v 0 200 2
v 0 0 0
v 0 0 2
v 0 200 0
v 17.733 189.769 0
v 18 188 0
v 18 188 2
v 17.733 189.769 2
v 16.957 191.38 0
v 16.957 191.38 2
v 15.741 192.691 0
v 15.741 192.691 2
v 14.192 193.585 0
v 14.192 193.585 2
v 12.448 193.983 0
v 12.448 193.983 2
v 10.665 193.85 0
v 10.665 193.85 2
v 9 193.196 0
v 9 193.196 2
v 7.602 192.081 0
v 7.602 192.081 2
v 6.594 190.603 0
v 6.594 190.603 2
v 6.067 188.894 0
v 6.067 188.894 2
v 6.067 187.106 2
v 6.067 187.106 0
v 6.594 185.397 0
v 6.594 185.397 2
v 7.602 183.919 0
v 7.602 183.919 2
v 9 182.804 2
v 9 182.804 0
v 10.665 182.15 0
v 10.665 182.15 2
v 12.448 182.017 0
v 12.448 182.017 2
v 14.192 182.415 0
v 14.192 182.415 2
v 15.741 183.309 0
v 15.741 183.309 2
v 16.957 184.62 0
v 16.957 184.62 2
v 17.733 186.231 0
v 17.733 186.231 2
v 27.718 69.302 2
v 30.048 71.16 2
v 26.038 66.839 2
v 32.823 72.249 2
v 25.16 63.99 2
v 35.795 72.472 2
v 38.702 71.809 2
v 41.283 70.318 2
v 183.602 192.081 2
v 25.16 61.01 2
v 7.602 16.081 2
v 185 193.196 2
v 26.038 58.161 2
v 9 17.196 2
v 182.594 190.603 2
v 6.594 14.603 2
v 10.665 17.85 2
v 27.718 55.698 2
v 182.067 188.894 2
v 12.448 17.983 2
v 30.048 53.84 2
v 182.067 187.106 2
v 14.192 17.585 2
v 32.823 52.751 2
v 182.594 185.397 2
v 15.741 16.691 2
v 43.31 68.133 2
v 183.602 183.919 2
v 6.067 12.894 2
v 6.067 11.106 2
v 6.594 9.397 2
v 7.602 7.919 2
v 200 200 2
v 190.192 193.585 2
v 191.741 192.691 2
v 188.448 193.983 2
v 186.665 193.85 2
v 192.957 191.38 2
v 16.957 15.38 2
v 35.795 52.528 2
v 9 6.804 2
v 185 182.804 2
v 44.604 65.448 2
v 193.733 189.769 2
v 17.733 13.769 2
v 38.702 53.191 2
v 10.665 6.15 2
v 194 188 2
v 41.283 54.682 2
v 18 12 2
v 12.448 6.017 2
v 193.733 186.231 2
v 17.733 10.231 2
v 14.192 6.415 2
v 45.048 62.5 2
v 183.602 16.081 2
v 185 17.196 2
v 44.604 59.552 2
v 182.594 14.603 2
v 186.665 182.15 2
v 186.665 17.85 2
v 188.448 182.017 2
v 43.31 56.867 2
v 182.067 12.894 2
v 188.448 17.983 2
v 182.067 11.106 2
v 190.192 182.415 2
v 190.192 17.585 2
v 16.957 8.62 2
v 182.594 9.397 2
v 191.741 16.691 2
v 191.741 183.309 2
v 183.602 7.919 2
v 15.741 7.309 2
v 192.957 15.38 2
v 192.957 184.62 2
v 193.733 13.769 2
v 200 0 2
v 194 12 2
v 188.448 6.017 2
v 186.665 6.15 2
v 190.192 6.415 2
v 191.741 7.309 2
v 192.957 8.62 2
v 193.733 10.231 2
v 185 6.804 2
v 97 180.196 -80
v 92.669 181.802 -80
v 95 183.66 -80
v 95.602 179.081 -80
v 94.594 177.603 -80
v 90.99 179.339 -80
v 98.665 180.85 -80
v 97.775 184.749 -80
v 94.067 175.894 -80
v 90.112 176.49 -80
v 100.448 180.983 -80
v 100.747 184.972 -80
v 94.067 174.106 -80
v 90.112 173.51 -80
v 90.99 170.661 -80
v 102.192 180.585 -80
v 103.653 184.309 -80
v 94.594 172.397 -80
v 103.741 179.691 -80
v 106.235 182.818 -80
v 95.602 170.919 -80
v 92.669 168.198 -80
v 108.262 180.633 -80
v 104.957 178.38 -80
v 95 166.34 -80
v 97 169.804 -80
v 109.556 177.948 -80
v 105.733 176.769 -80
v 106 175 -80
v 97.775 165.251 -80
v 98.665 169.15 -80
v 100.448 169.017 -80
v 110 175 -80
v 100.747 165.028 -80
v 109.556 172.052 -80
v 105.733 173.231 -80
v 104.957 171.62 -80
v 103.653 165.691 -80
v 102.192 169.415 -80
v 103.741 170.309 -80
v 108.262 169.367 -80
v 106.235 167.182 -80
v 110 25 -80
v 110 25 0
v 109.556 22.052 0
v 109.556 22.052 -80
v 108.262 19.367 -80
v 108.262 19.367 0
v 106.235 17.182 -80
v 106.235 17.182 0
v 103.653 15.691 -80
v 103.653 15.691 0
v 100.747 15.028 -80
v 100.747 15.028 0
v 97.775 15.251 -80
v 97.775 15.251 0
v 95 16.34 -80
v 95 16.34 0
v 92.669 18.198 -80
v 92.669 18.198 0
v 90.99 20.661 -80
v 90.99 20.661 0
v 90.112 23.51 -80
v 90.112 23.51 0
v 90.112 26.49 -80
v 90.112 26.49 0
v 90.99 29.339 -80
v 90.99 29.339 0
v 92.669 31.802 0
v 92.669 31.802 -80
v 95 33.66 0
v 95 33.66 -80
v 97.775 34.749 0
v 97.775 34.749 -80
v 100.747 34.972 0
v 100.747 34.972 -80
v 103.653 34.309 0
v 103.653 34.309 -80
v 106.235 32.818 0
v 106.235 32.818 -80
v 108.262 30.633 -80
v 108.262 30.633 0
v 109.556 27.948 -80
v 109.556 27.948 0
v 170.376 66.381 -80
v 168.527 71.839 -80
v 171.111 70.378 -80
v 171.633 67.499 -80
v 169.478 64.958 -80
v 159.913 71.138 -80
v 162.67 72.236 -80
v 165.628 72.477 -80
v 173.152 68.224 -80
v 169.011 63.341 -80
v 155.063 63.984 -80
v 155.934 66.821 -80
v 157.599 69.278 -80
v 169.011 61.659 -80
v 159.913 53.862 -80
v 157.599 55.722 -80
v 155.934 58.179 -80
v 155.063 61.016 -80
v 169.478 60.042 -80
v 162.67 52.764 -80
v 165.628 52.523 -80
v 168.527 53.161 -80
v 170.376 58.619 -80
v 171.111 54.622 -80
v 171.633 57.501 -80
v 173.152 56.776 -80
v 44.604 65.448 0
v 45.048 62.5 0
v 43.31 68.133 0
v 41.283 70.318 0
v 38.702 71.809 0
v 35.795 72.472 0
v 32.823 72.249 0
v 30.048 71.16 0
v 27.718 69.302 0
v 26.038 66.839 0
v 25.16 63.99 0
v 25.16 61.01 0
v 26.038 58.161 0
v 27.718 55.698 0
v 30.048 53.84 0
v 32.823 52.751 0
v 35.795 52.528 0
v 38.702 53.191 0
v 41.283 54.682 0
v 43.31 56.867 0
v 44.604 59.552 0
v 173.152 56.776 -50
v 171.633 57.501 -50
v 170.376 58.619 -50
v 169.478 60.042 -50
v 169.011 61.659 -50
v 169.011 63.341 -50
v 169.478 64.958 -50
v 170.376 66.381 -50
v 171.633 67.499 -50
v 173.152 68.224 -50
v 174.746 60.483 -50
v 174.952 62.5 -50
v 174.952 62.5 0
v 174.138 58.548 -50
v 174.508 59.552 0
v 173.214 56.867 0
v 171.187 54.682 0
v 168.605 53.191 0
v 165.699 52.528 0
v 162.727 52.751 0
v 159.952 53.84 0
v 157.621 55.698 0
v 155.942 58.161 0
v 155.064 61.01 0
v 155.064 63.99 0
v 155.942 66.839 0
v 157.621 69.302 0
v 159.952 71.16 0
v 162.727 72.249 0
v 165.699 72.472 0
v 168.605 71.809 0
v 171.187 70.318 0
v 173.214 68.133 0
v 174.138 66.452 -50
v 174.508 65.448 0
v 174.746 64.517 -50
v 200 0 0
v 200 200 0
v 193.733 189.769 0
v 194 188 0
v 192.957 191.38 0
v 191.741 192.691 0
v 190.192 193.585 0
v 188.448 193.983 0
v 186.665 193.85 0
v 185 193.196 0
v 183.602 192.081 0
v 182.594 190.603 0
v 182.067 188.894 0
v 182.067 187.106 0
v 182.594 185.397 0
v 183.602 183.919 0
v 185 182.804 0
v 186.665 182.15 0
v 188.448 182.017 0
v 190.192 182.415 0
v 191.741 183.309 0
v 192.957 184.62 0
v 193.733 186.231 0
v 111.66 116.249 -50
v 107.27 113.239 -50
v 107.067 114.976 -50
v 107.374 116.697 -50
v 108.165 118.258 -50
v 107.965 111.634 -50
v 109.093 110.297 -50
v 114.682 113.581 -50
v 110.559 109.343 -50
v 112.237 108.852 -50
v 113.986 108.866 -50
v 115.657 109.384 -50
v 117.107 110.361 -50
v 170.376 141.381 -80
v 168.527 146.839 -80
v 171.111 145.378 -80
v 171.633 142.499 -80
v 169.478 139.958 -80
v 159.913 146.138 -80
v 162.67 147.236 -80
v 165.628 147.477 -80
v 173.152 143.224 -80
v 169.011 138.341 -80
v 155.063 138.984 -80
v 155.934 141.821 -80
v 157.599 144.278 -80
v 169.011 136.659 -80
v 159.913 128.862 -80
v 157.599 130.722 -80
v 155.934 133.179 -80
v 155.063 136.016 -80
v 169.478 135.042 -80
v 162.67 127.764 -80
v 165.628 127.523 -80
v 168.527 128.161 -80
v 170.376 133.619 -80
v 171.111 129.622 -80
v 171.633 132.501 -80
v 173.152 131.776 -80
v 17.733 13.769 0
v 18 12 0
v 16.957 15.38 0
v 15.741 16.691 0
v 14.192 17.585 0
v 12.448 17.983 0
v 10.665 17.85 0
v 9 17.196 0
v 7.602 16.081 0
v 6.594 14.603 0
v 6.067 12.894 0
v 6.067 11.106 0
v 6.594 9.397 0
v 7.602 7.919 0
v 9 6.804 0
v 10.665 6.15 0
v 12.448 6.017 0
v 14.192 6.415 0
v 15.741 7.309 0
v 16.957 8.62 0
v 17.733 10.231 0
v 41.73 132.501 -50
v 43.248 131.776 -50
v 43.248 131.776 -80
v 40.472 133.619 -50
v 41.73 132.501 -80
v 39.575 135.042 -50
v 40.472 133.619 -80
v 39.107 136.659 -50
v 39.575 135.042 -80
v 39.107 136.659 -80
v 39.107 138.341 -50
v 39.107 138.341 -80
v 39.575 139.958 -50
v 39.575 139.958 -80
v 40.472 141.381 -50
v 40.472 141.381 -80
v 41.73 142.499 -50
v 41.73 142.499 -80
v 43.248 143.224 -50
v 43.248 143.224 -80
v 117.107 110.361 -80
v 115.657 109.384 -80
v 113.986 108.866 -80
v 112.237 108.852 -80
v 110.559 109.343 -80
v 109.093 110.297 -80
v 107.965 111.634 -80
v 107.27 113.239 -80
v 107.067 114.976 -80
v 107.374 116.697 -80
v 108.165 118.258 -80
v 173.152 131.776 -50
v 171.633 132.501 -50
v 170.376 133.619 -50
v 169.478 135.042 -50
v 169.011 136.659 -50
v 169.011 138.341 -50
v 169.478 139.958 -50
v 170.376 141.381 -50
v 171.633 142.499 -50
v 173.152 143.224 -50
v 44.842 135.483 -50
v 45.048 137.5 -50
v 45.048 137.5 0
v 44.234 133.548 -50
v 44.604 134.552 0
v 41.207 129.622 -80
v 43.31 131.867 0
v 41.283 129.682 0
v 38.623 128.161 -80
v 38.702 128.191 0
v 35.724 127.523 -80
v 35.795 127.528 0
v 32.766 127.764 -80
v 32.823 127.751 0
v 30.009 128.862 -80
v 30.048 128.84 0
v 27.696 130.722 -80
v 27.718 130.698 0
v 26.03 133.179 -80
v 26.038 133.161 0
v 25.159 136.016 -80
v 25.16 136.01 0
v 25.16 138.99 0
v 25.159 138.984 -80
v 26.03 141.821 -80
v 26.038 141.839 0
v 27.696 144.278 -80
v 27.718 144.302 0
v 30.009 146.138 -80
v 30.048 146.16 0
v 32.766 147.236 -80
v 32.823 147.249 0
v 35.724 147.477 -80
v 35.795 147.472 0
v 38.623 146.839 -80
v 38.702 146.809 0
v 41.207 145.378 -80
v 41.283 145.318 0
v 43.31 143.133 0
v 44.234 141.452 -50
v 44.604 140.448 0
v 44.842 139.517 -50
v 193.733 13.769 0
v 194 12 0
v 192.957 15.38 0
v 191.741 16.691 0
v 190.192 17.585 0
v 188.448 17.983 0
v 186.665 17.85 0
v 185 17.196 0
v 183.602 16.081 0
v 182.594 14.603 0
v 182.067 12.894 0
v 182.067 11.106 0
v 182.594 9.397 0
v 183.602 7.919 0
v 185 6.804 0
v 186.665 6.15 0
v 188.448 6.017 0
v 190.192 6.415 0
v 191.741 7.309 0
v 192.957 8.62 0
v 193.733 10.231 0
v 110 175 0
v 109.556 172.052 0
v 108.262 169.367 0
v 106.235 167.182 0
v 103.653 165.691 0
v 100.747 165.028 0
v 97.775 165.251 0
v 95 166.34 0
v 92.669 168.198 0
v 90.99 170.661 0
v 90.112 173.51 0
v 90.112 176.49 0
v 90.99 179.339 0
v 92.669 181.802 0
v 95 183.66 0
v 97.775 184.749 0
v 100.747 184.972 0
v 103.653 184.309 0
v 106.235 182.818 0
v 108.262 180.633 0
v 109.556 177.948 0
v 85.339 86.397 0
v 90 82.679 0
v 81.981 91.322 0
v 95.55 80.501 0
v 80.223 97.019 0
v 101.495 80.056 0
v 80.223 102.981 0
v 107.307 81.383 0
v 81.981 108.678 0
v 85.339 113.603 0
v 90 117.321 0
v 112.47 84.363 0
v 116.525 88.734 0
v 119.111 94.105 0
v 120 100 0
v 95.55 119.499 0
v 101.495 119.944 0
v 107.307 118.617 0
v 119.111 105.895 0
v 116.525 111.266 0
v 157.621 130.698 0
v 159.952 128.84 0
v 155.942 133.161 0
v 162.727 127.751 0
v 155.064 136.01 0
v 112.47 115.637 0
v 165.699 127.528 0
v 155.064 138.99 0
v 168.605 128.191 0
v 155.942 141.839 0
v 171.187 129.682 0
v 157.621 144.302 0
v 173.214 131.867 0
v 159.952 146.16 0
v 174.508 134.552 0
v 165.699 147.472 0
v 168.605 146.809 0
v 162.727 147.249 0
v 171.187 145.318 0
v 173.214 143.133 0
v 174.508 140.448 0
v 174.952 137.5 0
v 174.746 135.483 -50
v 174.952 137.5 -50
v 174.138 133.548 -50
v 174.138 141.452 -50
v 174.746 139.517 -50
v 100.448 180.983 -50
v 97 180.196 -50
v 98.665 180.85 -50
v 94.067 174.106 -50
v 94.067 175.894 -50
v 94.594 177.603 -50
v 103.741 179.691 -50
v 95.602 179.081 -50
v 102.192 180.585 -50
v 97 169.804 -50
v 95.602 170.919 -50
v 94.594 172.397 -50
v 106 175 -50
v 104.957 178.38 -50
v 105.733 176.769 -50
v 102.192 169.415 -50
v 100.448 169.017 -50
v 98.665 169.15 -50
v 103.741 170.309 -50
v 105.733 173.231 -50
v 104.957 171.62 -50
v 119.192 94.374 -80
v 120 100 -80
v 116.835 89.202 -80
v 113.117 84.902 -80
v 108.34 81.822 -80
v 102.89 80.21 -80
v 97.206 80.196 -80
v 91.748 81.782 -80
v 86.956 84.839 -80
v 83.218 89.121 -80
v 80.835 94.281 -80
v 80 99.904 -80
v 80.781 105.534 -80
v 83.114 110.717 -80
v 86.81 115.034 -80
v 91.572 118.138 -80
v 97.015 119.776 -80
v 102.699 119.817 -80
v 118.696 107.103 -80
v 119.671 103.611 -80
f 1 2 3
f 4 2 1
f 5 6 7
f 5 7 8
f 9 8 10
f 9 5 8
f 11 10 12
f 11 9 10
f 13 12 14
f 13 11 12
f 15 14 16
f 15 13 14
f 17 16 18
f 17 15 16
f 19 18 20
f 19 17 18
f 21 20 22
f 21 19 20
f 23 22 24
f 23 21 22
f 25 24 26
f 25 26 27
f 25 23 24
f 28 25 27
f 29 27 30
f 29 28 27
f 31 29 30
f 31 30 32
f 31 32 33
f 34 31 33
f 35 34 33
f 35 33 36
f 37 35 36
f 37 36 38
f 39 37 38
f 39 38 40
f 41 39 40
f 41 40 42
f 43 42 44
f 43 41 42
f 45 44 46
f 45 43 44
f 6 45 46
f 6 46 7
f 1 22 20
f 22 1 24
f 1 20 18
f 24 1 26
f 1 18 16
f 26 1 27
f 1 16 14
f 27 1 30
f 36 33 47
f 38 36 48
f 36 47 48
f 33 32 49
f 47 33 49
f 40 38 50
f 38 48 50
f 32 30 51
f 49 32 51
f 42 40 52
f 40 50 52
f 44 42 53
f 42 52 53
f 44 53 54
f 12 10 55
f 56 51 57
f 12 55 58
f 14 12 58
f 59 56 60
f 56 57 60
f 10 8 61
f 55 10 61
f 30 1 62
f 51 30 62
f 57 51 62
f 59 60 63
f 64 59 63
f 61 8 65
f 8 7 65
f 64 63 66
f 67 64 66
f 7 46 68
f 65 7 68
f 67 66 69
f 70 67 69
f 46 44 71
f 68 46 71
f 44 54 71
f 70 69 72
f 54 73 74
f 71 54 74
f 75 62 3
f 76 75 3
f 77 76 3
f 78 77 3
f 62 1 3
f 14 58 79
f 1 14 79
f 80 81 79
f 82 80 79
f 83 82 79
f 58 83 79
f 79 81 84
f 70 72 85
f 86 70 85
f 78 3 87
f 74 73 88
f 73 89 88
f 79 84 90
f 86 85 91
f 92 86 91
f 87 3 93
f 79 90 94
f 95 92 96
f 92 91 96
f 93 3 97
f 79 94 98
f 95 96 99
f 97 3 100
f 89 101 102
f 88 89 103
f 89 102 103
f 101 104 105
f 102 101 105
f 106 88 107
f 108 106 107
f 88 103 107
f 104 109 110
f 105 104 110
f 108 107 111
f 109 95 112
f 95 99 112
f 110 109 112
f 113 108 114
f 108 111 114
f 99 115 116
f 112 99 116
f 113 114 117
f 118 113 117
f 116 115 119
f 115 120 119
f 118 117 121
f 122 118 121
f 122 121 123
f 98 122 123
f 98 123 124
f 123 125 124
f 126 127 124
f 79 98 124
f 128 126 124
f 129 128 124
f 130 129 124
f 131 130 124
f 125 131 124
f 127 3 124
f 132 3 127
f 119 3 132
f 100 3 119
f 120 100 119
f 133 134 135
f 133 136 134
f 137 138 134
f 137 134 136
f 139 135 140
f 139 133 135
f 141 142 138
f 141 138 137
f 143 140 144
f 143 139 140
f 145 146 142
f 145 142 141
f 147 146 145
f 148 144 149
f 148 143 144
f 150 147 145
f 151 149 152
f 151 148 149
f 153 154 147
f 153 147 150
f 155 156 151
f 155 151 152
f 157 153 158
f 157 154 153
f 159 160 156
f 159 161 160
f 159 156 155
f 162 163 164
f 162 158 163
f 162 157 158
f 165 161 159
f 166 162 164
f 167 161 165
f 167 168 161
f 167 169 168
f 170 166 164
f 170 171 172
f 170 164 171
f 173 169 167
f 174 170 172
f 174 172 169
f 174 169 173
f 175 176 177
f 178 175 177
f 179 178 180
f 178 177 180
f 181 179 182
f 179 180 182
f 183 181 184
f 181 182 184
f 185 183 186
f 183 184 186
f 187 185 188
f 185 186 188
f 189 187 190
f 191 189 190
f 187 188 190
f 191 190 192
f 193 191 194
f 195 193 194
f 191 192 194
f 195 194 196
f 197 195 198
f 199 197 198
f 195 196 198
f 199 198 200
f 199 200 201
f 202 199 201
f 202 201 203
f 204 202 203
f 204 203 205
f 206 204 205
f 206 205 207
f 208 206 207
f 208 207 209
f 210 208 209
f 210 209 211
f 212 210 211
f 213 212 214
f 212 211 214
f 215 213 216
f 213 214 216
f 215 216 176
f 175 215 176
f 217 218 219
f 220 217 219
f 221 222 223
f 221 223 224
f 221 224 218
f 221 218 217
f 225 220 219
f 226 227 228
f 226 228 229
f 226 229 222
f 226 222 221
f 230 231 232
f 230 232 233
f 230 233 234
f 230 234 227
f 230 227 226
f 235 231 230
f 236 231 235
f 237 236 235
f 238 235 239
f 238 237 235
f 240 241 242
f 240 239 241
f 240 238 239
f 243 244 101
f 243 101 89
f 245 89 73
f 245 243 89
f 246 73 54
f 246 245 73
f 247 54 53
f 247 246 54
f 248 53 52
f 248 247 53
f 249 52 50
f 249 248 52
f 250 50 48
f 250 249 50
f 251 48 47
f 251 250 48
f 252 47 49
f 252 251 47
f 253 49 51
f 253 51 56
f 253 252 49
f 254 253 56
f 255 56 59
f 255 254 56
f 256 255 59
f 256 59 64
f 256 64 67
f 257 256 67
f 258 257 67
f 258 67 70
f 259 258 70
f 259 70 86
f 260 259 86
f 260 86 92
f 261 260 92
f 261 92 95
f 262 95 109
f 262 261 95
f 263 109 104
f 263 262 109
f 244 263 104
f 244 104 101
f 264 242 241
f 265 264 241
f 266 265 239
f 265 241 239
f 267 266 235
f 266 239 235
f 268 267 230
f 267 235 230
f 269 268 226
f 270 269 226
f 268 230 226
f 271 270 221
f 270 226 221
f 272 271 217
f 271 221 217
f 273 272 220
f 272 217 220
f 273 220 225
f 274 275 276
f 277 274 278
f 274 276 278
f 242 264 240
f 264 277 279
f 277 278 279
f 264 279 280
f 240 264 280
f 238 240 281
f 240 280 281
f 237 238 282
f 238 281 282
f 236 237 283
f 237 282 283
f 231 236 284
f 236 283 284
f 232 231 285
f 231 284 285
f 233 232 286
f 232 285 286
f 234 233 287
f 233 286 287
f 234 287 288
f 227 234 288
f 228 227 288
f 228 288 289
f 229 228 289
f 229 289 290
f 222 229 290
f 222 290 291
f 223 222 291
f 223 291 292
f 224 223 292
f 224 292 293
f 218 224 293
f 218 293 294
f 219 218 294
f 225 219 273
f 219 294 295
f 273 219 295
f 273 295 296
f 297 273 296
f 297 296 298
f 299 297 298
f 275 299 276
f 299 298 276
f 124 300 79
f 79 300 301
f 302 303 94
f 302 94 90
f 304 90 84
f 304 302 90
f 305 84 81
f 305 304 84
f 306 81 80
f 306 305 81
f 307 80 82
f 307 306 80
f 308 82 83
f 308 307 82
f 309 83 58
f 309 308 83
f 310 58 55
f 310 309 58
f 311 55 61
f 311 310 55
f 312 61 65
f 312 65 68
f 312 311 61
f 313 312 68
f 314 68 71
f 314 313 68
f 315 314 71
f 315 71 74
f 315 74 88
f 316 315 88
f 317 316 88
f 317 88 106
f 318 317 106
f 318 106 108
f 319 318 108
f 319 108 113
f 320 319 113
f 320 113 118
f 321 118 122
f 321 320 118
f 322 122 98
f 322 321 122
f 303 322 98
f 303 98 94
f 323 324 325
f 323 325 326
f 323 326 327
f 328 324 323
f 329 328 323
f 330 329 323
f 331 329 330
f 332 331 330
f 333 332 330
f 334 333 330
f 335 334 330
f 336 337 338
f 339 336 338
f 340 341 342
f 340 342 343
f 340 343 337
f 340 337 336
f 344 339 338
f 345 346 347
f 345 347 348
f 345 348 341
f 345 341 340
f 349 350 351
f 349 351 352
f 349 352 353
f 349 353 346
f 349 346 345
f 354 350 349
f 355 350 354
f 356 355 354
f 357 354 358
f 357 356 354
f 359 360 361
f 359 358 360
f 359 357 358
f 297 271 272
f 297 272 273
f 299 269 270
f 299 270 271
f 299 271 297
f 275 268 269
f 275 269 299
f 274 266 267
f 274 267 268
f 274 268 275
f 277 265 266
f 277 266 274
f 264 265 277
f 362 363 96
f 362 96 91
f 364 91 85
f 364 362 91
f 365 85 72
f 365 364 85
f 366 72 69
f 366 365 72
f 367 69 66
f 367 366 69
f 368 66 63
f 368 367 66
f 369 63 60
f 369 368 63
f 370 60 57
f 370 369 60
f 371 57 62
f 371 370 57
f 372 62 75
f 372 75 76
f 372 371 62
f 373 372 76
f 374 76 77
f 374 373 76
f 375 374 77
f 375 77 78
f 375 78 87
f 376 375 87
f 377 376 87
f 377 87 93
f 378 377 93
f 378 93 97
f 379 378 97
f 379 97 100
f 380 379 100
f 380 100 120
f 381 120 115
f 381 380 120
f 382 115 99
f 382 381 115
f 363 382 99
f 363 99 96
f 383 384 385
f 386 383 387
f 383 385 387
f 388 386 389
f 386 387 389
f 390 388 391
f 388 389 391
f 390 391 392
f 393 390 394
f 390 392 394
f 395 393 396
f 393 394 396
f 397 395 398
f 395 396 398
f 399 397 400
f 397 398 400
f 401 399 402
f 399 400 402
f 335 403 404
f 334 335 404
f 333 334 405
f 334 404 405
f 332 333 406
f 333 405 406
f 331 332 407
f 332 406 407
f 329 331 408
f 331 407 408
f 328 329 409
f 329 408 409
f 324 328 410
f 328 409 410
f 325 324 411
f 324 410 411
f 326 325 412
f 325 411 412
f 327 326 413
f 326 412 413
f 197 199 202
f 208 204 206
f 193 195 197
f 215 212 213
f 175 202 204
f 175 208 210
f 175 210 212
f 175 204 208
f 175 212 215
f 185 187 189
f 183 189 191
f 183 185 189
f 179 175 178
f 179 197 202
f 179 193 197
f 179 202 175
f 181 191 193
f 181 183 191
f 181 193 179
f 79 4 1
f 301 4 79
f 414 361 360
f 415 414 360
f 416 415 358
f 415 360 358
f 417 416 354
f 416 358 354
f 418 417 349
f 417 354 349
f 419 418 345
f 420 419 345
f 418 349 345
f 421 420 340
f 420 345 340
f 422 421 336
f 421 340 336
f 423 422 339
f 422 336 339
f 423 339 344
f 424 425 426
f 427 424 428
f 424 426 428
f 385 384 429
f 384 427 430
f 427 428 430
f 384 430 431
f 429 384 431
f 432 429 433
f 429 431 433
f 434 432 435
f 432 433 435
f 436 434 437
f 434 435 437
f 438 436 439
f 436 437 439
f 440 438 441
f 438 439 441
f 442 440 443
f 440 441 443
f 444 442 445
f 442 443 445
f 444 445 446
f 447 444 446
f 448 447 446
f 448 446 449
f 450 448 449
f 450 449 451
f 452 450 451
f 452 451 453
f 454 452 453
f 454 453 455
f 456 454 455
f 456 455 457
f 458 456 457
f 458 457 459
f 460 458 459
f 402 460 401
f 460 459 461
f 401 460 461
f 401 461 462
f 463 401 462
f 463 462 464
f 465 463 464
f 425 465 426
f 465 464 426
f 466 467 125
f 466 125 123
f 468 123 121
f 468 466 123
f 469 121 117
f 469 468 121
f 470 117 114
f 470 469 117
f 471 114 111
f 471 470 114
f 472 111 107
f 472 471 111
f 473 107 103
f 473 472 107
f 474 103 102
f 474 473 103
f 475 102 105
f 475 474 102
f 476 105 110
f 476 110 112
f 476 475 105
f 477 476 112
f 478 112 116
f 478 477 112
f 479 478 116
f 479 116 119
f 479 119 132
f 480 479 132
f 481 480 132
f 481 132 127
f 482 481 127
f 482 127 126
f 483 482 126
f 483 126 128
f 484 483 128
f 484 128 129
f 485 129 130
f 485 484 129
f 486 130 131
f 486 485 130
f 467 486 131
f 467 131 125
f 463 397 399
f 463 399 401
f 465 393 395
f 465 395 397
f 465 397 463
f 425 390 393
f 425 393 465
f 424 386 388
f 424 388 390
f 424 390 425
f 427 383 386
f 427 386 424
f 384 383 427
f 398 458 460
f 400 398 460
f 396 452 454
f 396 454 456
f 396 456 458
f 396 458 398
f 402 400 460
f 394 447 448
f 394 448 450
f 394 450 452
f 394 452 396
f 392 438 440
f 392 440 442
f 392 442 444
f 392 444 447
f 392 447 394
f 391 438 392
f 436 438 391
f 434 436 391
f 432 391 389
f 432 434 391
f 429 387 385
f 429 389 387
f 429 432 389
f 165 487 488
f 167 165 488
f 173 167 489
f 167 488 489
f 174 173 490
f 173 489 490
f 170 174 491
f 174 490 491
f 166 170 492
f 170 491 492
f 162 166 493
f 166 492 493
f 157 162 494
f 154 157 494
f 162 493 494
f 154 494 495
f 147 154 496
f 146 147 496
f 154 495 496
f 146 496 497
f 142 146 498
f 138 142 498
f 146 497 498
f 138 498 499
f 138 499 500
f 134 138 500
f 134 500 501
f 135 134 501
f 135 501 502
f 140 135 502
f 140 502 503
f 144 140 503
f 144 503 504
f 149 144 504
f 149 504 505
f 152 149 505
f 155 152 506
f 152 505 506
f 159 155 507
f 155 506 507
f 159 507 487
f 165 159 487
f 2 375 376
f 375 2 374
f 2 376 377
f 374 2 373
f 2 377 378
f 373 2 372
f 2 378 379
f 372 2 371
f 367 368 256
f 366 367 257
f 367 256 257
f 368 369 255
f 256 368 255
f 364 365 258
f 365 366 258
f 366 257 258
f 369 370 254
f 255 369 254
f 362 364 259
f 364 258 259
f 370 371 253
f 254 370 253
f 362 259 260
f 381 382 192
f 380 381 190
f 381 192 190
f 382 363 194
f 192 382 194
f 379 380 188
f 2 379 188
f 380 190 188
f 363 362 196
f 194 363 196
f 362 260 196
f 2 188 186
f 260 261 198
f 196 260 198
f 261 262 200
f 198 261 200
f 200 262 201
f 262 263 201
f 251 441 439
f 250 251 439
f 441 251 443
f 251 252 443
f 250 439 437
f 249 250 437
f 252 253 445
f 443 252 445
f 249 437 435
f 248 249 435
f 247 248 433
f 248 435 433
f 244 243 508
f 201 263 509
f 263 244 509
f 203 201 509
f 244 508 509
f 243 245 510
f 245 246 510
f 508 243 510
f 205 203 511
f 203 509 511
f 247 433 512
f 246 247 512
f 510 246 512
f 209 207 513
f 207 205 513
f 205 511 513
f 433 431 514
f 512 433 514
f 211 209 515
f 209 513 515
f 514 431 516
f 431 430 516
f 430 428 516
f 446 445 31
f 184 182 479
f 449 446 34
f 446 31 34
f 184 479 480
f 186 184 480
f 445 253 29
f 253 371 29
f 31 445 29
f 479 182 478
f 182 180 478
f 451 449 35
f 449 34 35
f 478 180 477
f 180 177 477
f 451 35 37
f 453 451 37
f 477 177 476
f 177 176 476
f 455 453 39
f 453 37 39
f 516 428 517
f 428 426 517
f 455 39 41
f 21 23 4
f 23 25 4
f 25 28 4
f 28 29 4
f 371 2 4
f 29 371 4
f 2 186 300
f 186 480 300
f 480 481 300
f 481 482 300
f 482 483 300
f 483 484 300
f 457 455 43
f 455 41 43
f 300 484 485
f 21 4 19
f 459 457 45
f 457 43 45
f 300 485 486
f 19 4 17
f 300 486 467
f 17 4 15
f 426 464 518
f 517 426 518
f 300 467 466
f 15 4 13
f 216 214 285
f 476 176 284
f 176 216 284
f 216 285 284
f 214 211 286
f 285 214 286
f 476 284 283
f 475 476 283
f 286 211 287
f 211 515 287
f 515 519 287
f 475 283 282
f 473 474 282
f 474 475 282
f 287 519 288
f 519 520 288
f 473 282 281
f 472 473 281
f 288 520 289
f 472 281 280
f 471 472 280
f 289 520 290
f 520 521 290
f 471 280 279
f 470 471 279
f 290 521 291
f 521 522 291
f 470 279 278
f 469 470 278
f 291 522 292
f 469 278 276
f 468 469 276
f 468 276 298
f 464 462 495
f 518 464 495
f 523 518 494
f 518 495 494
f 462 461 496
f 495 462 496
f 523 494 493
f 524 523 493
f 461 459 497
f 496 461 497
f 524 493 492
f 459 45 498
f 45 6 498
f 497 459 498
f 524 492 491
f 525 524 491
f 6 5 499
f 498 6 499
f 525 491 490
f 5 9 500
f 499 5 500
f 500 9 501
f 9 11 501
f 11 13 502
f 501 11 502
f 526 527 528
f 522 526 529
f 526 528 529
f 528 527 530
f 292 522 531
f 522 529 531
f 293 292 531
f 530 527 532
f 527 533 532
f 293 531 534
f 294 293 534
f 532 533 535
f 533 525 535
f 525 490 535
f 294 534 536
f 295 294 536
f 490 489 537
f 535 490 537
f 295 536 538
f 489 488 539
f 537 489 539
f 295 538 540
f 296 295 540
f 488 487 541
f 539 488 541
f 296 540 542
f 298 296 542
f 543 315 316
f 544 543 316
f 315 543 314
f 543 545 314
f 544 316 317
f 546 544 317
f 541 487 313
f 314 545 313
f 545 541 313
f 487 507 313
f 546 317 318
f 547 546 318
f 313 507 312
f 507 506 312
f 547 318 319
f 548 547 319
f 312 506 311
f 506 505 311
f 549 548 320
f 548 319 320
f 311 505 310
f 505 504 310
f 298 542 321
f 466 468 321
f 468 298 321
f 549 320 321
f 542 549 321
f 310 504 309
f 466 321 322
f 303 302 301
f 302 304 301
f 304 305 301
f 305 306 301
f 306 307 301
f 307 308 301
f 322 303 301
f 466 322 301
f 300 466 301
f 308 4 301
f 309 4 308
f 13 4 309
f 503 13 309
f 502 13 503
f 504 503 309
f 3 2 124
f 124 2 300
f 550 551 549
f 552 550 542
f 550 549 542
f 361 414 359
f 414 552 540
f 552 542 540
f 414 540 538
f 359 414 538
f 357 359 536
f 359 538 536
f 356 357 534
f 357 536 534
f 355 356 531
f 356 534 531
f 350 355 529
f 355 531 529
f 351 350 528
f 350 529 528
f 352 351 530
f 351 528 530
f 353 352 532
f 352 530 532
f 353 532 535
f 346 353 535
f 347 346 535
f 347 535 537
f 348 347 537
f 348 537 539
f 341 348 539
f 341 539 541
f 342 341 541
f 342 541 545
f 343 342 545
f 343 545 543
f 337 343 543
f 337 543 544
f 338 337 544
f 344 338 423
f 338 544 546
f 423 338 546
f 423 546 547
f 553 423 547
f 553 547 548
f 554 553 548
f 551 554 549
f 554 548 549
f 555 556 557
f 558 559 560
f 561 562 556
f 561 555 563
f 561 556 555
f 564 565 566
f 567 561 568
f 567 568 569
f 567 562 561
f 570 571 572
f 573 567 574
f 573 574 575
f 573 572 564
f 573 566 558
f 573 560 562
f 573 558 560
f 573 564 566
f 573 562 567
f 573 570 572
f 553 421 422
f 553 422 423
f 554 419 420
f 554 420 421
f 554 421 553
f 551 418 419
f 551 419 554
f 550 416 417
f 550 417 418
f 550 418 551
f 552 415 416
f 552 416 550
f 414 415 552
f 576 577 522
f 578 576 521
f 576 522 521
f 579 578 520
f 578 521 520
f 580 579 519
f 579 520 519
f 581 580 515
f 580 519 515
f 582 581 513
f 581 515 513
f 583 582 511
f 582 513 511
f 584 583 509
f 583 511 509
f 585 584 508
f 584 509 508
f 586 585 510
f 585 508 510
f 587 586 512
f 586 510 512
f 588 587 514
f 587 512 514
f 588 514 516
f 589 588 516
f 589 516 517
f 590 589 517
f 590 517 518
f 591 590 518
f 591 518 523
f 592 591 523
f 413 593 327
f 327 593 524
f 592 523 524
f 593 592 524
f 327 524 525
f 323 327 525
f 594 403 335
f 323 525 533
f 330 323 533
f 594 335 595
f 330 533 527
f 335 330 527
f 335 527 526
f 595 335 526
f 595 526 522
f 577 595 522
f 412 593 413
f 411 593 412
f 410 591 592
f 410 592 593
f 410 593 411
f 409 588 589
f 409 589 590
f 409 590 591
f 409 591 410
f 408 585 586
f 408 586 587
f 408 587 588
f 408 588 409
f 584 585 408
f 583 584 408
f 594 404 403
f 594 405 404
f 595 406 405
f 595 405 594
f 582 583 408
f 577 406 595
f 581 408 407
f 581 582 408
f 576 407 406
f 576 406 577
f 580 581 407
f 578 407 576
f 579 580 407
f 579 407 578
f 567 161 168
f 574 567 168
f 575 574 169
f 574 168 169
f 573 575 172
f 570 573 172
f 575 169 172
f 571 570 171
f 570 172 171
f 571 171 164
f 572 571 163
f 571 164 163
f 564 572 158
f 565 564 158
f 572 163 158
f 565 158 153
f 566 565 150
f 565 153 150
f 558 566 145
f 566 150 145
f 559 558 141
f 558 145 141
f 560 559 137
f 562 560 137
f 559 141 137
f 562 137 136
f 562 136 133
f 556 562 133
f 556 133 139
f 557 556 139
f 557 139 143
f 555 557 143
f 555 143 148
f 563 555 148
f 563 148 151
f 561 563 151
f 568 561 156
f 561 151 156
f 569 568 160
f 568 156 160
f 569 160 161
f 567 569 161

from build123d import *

# Parameters (mm, degrees)
SKETCH001_W       = 200
SKETCH001_H       = 200
SKETCH001_R       = 6
SKETCH001_R_2     = 10
SKETCH001_R_3     = 20
PAD_DEPTH         = 2
SKETCH_R          = 10
SKETCH_R_2        = 20
PAD001_DEPTH      = 80
PAD001_DEPTH_BACK = 2
SKETCH002_R       = 6
POCKET_DEPTH      = 30


with BuildPart() as part:
    # Sketch001 → Pad (new body)
    with BuildSketch(Plane.XY):
        with Locations((100, 100)):
            Rectangle(SKETCH001_W, SKETCH001_H)
        with Locations((12, 12)):
            Circle(SKETCH001_R, mode=Mode.SUBTRACT)
        with Locations((12, 188)):
            Circle(SKETCH001_R, mode=Mode.SUBTRACT)
        with Locations((188, 188)):
            Circle(SKETCH001_R, mode=Mode.SUBTRACT)
        with Locations((188, 12)):
            Circle(SKETCH001_R, mode=Mode.SUBTRACT)
        with Locations((100, 175)):
            Circle(SKETCH001_R_2, mode=Mode.SUBTRACT)
        with Locations((35.048095, 137.5)):
            Circle(SKETCH001_R_2, mode=Mode.SUBTRACT)
        with Locations((35.048095, 62.5)):
            Circle(SKETCH001_R_2, mode=Mode.SUBTRACT)
        with Locations((100, 25)):
            Circle(SKETCH001_R_2, mode=Mode.SUBTRACT)
        with Locations((164.951905, 62.5)):
            Circle(SKETCH001_R_2, mode=Mode.SUBTRACT)
        with Locations((164.951905, 137.5)):
            Circle(SKETCH001_R_2, mode=Mode.SUBTRACT)
        with Locations((100, 100)):
            Circle(SKETCH001_R_3, mode=Mode.SUBTRACT)
    extrude(amount=PAD_DEPTH)

    # Sketch (on Face16 of Pad) → Pad001 (new body, two sides)
    with BuildSketch(Plane(origin=(0, 0, 0), x_dir=(1, 0, 0), z_dir=(0, 0, -1))) as pad001_sk:
        with Locations((164.951905, -62.5)):
            Circle(SKETCH_R)
        with Locations((100, -175)):
            Circle(SKETCH_R)
        with Locations((100, -25)):
            Circle(SKETCH_R)
        with Locations((35.048095, -137.5)):
            Circle(SKETCH_R)
        with Locations((164.951905, -137.5)):
            Circle(SKETCH_R)
        with Locations((100, -100)):
            Circle(SKETCH_R_2)
    extrude(amount=PAD001_DEPTH)
    extrude(pad001_sk.sketch, amount=-PAD001_DEPTH_BACK)

    # Sketch002 (on Face24 of Pad001) → Pocket (cut)
    with BuildSketch(Plane(origin=(0, 0, -80), x_dir=(1, 0, 0), z_dir=(0, 0, -1))):
        with Locations((113.064442, -114.794754)):
            Circle(SKETCH002_R)
        with Locations((35.048095, -62.5)):
            Circle(SKETCH002_R)
        with Locations((100, -175)):
            Circle(SKETCH002_R)
        with Locations((45.048095, -137.5)):
            Circle(SKETCH002_R)
        with Locations((174.951905, -62.5)):
            Circle(SKETCH002_R)
        with Locations((174.951905, -137.5)):
            Circle(SKETCH002_R)
    extrude(amount=-POCKET_DEPTH, mode=Mode.SUBTRACT)


solid = part.part
